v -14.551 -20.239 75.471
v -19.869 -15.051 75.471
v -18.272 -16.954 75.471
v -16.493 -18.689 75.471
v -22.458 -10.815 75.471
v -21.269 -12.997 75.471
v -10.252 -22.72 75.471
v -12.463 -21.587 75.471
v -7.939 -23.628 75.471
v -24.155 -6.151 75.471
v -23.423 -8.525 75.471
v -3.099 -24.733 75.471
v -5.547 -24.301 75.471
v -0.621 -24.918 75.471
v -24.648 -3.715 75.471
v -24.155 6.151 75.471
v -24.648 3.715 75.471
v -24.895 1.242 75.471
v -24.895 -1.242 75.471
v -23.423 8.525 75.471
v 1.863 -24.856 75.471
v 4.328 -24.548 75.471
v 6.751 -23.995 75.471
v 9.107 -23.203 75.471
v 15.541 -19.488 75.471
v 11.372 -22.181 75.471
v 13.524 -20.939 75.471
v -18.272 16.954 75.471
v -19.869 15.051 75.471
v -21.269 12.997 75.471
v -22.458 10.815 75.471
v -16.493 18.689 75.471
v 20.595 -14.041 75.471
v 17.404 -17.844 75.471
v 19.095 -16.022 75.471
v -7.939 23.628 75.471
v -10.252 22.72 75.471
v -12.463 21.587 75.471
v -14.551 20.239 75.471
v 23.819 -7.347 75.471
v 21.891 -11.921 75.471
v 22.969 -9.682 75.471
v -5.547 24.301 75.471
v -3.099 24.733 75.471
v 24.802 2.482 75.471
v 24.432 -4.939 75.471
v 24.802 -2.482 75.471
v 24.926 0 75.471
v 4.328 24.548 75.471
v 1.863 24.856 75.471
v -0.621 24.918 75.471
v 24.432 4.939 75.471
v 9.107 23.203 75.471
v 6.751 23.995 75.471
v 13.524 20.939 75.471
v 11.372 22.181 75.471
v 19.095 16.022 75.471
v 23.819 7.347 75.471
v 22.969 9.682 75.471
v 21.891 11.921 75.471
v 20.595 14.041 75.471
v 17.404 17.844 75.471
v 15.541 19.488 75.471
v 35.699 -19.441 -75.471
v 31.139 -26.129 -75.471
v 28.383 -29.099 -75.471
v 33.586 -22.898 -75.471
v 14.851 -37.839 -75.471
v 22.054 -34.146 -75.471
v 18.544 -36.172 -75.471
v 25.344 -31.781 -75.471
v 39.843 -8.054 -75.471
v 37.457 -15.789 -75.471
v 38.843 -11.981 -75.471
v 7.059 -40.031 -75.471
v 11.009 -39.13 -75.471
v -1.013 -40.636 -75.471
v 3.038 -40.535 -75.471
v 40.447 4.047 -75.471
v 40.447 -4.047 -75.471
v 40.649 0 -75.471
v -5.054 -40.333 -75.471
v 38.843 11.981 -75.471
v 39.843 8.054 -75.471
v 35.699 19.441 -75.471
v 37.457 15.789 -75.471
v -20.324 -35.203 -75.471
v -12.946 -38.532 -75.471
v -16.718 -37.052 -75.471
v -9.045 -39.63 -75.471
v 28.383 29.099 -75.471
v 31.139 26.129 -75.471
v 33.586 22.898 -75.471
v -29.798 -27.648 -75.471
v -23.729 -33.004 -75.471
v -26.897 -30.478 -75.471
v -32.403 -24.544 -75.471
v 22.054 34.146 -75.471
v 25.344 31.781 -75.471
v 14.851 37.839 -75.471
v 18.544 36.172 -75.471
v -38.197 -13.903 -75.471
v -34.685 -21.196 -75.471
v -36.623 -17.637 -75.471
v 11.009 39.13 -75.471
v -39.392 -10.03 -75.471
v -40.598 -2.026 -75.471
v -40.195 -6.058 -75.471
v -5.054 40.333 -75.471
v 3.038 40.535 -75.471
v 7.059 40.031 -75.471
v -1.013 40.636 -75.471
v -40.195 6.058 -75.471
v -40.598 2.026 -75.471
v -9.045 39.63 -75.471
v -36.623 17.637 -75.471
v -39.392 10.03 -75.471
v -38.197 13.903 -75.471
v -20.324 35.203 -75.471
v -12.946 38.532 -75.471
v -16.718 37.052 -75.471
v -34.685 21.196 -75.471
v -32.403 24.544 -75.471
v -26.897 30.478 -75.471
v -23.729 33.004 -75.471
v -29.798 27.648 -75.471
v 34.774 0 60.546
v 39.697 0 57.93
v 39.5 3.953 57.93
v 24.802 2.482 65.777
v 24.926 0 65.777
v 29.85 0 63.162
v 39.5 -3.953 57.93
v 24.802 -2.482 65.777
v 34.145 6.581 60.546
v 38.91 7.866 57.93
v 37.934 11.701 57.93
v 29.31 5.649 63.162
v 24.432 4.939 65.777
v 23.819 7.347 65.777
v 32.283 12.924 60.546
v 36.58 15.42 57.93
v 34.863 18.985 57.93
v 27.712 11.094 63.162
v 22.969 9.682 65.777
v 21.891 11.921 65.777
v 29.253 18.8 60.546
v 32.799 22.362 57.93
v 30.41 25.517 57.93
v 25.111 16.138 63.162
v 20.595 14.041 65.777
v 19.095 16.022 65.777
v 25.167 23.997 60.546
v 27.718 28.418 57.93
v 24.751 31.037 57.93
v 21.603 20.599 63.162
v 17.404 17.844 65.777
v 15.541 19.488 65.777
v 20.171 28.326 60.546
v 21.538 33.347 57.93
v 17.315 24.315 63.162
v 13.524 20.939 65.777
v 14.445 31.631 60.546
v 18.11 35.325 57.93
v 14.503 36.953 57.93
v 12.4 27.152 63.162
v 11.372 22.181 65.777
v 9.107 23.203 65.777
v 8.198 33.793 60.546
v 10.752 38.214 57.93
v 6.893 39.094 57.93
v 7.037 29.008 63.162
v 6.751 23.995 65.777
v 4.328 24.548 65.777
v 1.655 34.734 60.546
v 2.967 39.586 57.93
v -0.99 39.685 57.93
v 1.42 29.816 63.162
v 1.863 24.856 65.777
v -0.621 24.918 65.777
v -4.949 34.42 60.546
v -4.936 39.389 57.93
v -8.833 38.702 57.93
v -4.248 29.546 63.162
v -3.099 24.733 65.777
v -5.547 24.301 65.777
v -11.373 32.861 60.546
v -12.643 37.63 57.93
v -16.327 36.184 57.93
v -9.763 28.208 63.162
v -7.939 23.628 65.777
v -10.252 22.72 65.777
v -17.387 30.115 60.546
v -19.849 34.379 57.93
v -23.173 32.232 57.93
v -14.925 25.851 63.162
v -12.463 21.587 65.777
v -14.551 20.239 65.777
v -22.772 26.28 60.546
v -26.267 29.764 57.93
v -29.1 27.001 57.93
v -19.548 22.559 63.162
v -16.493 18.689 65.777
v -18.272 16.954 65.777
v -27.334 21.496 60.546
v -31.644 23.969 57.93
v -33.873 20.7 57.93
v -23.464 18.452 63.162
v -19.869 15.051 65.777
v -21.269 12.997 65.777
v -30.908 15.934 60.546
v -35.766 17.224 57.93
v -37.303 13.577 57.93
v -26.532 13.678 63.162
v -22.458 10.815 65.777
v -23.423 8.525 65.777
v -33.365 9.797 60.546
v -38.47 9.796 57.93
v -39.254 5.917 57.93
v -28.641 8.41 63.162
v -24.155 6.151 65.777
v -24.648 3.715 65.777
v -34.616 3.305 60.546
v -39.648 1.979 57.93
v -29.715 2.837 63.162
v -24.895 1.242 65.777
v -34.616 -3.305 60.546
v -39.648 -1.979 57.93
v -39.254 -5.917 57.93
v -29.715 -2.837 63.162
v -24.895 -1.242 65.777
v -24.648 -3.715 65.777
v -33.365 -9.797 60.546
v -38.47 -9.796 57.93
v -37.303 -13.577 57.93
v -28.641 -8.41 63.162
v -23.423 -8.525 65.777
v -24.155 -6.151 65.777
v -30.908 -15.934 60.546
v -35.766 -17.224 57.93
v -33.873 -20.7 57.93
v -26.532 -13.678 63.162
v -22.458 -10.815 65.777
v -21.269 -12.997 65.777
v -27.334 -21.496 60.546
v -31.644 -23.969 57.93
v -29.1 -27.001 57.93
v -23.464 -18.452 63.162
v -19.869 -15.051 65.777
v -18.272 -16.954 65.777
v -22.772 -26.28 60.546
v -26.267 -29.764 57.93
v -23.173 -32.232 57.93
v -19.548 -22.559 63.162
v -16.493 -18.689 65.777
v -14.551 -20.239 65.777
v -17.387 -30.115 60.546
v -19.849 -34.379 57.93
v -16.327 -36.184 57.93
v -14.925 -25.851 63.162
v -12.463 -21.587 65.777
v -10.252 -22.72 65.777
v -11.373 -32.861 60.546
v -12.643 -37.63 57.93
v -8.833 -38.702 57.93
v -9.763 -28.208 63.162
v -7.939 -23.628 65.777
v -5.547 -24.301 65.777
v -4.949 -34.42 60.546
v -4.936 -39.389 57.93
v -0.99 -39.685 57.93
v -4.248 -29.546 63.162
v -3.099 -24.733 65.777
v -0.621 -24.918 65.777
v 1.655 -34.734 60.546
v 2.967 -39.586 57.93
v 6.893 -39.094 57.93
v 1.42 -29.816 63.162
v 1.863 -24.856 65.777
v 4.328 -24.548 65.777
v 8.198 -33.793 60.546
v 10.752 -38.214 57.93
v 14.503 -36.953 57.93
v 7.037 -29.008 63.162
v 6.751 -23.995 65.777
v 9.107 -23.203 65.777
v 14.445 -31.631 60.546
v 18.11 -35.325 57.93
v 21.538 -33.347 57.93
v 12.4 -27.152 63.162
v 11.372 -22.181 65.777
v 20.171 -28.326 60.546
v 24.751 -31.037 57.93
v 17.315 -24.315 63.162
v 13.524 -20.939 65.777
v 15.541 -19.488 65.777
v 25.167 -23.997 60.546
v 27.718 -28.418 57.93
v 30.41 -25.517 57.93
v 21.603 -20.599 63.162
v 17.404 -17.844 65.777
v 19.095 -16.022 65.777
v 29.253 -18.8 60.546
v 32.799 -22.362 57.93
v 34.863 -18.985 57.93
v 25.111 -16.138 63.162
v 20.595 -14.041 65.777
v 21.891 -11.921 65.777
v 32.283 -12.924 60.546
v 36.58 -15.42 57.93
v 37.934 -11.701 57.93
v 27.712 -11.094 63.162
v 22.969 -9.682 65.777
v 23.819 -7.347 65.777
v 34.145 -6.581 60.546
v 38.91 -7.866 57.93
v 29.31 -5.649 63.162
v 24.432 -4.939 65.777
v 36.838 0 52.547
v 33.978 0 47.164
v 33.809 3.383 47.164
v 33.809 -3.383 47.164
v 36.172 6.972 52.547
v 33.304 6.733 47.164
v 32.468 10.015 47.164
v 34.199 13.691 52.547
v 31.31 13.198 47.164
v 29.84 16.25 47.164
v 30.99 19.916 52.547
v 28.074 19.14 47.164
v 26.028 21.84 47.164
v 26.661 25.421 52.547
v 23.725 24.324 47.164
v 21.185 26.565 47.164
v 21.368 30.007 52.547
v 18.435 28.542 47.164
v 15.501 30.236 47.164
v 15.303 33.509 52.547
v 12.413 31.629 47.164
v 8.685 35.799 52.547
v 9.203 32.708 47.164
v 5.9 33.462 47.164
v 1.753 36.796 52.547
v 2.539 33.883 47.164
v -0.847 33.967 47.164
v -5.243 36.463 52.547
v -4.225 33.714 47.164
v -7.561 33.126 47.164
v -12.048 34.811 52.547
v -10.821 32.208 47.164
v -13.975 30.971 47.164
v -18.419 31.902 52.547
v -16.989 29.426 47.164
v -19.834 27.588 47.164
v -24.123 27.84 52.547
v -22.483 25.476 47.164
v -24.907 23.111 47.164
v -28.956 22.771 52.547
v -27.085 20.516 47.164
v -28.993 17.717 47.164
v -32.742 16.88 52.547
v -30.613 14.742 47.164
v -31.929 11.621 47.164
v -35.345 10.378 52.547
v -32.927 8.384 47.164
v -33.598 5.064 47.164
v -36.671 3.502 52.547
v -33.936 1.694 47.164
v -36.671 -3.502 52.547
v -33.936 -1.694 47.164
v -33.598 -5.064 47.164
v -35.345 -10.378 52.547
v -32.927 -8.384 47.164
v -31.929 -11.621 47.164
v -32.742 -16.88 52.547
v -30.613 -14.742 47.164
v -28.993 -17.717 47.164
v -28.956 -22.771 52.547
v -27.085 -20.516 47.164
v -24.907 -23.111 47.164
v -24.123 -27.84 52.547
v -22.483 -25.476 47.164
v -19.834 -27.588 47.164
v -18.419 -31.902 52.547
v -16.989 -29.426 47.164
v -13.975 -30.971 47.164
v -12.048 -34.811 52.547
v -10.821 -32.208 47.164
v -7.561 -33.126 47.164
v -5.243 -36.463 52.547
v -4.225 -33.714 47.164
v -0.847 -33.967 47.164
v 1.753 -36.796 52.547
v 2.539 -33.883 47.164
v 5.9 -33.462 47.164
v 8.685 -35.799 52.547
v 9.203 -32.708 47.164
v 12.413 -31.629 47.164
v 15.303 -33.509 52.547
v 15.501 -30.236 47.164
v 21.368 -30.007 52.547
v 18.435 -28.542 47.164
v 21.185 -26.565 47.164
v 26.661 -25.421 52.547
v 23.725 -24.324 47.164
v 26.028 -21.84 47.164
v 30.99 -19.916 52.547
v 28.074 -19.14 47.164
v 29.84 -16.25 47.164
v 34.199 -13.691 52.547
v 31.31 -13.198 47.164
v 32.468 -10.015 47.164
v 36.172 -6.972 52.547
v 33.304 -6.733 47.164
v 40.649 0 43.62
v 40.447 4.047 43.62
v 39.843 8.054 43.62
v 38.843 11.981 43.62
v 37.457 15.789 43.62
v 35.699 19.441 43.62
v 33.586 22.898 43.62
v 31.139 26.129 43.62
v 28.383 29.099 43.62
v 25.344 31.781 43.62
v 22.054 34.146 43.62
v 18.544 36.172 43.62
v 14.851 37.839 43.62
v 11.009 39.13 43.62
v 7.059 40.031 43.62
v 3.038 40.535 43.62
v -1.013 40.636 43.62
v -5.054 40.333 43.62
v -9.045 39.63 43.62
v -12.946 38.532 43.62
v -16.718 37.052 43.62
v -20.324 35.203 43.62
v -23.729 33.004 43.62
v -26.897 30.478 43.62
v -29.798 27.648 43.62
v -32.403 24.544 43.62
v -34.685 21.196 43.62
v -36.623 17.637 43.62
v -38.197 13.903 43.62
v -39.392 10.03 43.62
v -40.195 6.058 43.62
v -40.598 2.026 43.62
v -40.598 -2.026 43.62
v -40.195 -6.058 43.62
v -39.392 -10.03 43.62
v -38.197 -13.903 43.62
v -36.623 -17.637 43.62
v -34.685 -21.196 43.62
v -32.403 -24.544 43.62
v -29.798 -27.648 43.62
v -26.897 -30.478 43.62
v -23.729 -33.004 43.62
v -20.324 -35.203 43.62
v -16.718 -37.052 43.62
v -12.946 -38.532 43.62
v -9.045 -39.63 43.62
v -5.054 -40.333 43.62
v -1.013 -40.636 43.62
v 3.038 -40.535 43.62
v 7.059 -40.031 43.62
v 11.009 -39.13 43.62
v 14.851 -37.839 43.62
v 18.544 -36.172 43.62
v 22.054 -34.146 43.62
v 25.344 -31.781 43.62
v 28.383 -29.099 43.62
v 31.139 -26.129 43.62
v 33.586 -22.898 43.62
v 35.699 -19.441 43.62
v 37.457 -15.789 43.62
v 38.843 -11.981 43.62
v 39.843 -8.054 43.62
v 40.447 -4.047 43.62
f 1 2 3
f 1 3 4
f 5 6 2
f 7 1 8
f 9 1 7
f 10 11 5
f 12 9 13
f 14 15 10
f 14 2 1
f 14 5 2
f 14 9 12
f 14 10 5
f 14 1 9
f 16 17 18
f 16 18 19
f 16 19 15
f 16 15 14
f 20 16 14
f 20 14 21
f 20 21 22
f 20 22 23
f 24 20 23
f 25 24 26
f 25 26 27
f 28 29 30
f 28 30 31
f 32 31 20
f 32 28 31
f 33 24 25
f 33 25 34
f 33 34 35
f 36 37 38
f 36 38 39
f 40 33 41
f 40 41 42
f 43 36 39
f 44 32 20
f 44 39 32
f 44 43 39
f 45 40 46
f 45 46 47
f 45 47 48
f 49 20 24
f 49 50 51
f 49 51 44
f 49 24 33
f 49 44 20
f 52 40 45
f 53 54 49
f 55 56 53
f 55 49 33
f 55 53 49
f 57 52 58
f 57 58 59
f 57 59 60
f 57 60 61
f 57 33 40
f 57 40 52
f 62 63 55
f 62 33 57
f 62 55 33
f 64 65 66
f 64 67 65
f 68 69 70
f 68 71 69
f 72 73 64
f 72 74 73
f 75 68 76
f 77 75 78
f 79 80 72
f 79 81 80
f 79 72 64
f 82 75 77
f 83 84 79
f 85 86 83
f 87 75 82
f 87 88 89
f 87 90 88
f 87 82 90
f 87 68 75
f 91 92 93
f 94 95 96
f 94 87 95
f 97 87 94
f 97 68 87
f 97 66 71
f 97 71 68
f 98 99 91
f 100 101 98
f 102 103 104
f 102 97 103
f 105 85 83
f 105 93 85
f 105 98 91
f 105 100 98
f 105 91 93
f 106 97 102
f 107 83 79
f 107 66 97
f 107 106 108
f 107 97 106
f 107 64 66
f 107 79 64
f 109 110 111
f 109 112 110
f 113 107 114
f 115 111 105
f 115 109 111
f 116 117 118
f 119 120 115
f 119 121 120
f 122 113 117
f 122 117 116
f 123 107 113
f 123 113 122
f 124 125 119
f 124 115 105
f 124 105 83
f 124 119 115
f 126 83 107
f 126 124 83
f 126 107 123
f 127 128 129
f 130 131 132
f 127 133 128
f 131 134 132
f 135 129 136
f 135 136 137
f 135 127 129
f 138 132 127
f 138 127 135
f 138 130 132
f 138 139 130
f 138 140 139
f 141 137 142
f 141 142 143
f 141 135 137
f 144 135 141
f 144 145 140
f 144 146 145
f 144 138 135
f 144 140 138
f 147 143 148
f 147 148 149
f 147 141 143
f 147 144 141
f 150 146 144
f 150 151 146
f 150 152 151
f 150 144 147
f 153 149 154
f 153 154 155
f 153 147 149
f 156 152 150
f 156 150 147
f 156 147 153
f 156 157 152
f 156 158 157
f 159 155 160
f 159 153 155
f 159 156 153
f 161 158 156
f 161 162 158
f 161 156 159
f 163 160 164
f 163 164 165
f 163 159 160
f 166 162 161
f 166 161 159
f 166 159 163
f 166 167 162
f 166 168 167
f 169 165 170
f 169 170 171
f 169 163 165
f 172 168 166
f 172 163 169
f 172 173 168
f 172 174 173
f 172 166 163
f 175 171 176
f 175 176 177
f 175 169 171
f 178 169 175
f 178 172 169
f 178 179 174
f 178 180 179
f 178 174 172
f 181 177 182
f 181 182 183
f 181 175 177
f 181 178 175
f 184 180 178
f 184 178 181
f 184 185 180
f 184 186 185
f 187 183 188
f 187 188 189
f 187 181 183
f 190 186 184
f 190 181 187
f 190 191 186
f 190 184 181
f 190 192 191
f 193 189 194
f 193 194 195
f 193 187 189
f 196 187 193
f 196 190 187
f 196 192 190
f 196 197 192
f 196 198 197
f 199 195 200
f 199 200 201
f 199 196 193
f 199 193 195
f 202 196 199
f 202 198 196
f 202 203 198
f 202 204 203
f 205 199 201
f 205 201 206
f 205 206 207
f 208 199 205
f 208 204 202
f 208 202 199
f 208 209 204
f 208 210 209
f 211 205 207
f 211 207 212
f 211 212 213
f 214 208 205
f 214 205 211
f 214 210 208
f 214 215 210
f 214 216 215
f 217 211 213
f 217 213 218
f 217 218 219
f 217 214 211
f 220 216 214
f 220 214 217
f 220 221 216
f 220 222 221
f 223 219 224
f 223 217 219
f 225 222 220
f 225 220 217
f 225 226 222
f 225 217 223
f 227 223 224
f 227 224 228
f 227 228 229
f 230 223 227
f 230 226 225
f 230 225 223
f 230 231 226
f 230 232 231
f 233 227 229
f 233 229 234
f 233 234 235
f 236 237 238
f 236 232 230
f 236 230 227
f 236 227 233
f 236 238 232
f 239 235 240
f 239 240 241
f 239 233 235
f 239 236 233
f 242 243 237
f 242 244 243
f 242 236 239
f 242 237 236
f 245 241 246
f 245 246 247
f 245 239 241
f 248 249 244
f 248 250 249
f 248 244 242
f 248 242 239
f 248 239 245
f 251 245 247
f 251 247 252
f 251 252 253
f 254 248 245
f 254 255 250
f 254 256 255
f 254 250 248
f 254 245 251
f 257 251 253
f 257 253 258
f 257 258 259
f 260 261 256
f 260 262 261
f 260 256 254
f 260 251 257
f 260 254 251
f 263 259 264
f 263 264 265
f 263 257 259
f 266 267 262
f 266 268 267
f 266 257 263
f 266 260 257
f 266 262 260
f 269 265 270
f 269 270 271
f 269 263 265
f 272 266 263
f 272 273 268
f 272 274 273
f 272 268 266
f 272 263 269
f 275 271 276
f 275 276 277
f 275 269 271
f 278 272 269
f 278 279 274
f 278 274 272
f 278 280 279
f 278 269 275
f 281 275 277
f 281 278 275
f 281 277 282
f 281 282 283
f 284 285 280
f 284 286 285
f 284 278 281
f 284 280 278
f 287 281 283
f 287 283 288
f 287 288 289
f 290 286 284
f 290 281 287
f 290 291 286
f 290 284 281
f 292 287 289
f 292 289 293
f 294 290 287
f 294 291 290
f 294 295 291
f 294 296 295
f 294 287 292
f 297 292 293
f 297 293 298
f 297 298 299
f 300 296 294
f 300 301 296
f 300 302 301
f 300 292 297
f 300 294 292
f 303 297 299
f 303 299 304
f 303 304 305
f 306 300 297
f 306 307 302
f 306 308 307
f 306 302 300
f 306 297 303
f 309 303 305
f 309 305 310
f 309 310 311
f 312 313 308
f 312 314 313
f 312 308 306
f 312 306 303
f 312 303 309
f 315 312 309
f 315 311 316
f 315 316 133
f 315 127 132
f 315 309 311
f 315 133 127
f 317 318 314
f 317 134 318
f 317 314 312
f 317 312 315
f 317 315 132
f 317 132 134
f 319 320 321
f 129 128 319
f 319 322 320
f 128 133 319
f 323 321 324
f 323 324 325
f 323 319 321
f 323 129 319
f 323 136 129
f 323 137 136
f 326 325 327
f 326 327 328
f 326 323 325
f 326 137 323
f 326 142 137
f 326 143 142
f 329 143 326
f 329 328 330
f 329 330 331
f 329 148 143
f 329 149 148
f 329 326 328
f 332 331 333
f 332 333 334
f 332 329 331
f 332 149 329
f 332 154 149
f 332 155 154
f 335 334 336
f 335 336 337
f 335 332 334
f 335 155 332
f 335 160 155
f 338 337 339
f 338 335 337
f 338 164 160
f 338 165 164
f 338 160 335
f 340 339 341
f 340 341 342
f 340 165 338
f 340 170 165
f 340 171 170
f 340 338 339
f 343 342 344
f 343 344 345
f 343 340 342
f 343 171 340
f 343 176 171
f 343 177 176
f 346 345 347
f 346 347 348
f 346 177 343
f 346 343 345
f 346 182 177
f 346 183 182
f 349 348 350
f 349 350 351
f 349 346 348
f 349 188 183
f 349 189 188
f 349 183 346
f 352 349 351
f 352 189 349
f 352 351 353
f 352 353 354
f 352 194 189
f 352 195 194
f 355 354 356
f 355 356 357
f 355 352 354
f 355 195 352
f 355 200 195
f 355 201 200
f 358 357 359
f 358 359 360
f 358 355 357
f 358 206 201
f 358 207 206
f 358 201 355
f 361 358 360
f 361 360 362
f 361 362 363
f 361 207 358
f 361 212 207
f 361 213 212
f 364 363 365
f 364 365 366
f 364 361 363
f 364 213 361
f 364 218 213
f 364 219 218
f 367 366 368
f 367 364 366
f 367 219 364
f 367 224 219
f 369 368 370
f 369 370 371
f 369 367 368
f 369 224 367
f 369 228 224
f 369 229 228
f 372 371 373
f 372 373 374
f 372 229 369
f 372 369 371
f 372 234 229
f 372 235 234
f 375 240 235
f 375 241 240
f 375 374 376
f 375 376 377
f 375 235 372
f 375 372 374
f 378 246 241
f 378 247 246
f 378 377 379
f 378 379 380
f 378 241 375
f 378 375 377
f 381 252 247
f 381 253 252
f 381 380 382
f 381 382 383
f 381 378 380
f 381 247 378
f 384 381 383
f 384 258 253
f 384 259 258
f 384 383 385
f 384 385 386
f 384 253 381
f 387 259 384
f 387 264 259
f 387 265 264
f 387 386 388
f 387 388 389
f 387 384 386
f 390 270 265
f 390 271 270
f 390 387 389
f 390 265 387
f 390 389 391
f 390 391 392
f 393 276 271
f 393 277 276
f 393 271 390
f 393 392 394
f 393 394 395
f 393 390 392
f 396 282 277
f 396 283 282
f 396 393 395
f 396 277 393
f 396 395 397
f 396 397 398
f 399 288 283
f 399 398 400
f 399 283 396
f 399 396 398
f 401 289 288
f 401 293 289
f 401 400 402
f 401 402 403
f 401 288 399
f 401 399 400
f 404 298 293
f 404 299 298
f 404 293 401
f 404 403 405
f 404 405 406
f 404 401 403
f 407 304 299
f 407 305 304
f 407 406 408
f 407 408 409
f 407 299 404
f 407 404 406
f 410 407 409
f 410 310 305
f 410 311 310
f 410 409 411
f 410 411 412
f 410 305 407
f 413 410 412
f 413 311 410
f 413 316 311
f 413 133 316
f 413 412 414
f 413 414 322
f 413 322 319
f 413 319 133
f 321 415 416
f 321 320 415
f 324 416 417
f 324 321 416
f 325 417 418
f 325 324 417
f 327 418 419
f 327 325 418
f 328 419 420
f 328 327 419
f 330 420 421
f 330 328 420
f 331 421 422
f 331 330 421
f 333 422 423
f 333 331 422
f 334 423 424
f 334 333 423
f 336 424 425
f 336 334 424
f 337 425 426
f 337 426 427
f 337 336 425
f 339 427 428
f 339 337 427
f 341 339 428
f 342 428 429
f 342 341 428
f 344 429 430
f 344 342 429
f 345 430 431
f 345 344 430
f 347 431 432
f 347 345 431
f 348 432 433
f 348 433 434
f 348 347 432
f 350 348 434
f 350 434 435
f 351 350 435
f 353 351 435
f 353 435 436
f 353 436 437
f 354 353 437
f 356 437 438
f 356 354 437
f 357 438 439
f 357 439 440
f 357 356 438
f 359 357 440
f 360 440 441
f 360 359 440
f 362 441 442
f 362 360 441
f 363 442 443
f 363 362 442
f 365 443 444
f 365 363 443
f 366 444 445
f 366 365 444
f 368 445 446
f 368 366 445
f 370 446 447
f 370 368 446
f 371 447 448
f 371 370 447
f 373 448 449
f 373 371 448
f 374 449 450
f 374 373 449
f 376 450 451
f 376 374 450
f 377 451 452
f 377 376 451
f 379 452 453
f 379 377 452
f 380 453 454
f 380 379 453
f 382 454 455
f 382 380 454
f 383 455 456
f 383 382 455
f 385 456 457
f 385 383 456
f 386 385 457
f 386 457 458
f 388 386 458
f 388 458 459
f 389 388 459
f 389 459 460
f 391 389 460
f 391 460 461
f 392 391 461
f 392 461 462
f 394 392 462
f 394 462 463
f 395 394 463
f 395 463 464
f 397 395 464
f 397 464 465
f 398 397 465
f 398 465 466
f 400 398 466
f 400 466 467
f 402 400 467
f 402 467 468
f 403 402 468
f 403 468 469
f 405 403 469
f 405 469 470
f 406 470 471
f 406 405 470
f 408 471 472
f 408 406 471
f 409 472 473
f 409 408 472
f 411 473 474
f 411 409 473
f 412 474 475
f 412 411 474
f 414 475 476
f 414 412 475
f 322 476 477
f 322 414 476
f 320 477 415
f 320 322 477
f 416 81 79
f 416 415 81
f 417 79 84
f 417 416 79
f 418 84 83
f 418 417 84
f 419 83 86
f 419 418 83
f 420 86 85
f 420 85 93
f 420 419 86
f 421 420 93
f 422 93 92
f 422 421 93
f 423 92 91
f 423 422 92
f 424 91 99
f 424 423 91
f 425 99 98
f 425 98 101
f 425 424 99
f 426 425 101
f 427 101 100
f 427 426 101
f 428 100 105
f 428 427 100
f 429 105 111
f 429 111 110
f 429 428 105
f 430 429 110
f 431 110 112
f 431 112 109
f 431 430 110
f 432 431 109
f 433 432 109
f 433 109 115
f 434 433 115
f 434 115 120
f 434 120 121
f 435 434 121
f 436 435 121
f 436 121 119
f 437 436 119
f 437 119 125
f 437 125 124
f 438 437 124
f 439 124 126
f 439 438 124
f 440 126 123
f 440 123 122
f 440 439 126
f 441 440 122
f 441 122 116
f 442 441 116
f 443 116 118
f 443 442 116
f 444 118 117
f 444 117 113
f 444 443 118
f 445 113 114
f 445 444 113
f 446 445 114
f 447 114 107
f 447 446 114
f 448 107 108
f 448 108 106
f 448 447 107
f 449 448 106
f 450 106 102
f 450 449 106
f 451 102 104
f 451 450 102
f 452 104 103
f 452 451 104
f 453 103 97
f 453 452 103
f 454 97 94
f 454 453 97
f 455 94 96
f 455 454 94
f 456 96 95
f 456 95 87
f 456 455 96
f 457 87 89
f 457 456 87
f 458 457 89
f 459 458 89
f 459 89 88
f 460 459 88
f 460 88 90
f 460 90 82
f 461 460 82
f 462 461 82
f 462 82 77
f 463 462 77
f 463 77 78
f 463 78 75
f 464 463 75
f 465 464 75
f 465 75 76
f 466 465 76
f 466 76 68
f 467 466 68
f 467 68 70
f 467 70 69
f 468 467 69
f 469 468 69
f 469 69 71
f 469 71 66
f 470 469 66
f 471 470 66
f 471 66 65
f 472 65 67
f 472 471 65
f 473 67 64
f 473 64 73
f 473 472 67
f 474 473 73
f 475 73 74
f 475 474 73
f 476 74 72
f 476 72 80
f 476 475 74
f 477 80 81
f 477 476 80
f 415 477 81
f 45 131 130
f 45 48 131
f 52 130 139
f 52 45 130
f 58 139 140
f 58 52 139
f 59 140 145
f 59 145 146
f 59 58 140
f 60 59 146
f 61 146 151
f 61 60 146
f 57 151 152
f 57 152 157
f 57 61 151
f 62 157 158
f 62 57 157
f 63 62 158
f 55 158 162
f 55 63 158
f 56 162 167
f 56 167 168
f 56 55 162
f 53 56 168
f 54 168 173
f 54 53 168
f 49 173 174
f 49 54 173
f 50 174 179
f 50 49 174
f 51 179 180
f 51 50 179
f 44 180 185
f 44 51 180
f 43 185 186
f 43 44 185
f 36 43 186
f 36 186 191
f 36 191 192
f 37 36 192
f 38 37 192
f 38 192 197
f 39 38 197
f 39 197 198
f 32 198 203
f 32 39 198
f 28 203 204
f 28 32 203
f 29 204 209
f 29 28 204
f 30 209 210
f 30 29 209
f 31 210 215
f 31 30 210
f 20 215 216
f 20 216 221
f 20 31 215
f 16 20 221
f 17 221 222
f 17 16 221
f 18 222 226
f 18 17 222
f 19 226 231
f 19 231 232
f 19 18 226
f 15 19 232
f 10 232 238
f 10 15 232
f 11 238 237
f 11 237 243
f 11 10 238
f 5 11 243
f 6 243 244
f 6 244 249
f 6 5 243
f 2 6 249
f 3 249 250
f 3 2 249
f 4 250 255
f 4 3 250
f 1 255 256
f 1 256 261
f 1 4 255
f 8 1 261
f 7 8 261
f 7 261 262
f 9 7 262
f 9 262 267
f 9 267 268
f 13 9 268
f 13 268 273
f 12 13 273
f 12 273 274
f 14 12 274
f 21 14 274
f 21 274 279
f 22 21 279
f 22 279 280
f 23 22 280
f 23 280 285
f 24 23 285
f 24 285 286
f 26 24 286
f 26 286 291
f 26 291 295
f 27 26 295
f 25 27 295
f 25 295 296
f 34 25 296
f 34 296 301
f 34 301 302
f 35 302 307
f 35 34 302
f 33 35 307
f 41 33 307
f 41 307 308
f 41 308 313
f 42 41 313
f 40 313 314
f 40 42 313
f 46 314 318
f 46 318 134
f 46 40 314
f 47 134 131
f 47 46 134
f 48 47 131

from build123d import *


with BuildPart() as f1:
    # F0 (on Front) → F1 (revolve)
    with BuildSketch(Plane.XZ):
        Polygon((24.926189, 75.470962), (0, 75.470962), (0, -75.470954), (40.648924, -75.470954), (40.648924, 43.620129), (33.977756, 47.164189), (39.69726, 57.930309), (24.926189, 65.777443), align=None)
    revolve(axis=Axis((0, 0, 4e-06), (0, 0, 1)))


solid = f1.part
